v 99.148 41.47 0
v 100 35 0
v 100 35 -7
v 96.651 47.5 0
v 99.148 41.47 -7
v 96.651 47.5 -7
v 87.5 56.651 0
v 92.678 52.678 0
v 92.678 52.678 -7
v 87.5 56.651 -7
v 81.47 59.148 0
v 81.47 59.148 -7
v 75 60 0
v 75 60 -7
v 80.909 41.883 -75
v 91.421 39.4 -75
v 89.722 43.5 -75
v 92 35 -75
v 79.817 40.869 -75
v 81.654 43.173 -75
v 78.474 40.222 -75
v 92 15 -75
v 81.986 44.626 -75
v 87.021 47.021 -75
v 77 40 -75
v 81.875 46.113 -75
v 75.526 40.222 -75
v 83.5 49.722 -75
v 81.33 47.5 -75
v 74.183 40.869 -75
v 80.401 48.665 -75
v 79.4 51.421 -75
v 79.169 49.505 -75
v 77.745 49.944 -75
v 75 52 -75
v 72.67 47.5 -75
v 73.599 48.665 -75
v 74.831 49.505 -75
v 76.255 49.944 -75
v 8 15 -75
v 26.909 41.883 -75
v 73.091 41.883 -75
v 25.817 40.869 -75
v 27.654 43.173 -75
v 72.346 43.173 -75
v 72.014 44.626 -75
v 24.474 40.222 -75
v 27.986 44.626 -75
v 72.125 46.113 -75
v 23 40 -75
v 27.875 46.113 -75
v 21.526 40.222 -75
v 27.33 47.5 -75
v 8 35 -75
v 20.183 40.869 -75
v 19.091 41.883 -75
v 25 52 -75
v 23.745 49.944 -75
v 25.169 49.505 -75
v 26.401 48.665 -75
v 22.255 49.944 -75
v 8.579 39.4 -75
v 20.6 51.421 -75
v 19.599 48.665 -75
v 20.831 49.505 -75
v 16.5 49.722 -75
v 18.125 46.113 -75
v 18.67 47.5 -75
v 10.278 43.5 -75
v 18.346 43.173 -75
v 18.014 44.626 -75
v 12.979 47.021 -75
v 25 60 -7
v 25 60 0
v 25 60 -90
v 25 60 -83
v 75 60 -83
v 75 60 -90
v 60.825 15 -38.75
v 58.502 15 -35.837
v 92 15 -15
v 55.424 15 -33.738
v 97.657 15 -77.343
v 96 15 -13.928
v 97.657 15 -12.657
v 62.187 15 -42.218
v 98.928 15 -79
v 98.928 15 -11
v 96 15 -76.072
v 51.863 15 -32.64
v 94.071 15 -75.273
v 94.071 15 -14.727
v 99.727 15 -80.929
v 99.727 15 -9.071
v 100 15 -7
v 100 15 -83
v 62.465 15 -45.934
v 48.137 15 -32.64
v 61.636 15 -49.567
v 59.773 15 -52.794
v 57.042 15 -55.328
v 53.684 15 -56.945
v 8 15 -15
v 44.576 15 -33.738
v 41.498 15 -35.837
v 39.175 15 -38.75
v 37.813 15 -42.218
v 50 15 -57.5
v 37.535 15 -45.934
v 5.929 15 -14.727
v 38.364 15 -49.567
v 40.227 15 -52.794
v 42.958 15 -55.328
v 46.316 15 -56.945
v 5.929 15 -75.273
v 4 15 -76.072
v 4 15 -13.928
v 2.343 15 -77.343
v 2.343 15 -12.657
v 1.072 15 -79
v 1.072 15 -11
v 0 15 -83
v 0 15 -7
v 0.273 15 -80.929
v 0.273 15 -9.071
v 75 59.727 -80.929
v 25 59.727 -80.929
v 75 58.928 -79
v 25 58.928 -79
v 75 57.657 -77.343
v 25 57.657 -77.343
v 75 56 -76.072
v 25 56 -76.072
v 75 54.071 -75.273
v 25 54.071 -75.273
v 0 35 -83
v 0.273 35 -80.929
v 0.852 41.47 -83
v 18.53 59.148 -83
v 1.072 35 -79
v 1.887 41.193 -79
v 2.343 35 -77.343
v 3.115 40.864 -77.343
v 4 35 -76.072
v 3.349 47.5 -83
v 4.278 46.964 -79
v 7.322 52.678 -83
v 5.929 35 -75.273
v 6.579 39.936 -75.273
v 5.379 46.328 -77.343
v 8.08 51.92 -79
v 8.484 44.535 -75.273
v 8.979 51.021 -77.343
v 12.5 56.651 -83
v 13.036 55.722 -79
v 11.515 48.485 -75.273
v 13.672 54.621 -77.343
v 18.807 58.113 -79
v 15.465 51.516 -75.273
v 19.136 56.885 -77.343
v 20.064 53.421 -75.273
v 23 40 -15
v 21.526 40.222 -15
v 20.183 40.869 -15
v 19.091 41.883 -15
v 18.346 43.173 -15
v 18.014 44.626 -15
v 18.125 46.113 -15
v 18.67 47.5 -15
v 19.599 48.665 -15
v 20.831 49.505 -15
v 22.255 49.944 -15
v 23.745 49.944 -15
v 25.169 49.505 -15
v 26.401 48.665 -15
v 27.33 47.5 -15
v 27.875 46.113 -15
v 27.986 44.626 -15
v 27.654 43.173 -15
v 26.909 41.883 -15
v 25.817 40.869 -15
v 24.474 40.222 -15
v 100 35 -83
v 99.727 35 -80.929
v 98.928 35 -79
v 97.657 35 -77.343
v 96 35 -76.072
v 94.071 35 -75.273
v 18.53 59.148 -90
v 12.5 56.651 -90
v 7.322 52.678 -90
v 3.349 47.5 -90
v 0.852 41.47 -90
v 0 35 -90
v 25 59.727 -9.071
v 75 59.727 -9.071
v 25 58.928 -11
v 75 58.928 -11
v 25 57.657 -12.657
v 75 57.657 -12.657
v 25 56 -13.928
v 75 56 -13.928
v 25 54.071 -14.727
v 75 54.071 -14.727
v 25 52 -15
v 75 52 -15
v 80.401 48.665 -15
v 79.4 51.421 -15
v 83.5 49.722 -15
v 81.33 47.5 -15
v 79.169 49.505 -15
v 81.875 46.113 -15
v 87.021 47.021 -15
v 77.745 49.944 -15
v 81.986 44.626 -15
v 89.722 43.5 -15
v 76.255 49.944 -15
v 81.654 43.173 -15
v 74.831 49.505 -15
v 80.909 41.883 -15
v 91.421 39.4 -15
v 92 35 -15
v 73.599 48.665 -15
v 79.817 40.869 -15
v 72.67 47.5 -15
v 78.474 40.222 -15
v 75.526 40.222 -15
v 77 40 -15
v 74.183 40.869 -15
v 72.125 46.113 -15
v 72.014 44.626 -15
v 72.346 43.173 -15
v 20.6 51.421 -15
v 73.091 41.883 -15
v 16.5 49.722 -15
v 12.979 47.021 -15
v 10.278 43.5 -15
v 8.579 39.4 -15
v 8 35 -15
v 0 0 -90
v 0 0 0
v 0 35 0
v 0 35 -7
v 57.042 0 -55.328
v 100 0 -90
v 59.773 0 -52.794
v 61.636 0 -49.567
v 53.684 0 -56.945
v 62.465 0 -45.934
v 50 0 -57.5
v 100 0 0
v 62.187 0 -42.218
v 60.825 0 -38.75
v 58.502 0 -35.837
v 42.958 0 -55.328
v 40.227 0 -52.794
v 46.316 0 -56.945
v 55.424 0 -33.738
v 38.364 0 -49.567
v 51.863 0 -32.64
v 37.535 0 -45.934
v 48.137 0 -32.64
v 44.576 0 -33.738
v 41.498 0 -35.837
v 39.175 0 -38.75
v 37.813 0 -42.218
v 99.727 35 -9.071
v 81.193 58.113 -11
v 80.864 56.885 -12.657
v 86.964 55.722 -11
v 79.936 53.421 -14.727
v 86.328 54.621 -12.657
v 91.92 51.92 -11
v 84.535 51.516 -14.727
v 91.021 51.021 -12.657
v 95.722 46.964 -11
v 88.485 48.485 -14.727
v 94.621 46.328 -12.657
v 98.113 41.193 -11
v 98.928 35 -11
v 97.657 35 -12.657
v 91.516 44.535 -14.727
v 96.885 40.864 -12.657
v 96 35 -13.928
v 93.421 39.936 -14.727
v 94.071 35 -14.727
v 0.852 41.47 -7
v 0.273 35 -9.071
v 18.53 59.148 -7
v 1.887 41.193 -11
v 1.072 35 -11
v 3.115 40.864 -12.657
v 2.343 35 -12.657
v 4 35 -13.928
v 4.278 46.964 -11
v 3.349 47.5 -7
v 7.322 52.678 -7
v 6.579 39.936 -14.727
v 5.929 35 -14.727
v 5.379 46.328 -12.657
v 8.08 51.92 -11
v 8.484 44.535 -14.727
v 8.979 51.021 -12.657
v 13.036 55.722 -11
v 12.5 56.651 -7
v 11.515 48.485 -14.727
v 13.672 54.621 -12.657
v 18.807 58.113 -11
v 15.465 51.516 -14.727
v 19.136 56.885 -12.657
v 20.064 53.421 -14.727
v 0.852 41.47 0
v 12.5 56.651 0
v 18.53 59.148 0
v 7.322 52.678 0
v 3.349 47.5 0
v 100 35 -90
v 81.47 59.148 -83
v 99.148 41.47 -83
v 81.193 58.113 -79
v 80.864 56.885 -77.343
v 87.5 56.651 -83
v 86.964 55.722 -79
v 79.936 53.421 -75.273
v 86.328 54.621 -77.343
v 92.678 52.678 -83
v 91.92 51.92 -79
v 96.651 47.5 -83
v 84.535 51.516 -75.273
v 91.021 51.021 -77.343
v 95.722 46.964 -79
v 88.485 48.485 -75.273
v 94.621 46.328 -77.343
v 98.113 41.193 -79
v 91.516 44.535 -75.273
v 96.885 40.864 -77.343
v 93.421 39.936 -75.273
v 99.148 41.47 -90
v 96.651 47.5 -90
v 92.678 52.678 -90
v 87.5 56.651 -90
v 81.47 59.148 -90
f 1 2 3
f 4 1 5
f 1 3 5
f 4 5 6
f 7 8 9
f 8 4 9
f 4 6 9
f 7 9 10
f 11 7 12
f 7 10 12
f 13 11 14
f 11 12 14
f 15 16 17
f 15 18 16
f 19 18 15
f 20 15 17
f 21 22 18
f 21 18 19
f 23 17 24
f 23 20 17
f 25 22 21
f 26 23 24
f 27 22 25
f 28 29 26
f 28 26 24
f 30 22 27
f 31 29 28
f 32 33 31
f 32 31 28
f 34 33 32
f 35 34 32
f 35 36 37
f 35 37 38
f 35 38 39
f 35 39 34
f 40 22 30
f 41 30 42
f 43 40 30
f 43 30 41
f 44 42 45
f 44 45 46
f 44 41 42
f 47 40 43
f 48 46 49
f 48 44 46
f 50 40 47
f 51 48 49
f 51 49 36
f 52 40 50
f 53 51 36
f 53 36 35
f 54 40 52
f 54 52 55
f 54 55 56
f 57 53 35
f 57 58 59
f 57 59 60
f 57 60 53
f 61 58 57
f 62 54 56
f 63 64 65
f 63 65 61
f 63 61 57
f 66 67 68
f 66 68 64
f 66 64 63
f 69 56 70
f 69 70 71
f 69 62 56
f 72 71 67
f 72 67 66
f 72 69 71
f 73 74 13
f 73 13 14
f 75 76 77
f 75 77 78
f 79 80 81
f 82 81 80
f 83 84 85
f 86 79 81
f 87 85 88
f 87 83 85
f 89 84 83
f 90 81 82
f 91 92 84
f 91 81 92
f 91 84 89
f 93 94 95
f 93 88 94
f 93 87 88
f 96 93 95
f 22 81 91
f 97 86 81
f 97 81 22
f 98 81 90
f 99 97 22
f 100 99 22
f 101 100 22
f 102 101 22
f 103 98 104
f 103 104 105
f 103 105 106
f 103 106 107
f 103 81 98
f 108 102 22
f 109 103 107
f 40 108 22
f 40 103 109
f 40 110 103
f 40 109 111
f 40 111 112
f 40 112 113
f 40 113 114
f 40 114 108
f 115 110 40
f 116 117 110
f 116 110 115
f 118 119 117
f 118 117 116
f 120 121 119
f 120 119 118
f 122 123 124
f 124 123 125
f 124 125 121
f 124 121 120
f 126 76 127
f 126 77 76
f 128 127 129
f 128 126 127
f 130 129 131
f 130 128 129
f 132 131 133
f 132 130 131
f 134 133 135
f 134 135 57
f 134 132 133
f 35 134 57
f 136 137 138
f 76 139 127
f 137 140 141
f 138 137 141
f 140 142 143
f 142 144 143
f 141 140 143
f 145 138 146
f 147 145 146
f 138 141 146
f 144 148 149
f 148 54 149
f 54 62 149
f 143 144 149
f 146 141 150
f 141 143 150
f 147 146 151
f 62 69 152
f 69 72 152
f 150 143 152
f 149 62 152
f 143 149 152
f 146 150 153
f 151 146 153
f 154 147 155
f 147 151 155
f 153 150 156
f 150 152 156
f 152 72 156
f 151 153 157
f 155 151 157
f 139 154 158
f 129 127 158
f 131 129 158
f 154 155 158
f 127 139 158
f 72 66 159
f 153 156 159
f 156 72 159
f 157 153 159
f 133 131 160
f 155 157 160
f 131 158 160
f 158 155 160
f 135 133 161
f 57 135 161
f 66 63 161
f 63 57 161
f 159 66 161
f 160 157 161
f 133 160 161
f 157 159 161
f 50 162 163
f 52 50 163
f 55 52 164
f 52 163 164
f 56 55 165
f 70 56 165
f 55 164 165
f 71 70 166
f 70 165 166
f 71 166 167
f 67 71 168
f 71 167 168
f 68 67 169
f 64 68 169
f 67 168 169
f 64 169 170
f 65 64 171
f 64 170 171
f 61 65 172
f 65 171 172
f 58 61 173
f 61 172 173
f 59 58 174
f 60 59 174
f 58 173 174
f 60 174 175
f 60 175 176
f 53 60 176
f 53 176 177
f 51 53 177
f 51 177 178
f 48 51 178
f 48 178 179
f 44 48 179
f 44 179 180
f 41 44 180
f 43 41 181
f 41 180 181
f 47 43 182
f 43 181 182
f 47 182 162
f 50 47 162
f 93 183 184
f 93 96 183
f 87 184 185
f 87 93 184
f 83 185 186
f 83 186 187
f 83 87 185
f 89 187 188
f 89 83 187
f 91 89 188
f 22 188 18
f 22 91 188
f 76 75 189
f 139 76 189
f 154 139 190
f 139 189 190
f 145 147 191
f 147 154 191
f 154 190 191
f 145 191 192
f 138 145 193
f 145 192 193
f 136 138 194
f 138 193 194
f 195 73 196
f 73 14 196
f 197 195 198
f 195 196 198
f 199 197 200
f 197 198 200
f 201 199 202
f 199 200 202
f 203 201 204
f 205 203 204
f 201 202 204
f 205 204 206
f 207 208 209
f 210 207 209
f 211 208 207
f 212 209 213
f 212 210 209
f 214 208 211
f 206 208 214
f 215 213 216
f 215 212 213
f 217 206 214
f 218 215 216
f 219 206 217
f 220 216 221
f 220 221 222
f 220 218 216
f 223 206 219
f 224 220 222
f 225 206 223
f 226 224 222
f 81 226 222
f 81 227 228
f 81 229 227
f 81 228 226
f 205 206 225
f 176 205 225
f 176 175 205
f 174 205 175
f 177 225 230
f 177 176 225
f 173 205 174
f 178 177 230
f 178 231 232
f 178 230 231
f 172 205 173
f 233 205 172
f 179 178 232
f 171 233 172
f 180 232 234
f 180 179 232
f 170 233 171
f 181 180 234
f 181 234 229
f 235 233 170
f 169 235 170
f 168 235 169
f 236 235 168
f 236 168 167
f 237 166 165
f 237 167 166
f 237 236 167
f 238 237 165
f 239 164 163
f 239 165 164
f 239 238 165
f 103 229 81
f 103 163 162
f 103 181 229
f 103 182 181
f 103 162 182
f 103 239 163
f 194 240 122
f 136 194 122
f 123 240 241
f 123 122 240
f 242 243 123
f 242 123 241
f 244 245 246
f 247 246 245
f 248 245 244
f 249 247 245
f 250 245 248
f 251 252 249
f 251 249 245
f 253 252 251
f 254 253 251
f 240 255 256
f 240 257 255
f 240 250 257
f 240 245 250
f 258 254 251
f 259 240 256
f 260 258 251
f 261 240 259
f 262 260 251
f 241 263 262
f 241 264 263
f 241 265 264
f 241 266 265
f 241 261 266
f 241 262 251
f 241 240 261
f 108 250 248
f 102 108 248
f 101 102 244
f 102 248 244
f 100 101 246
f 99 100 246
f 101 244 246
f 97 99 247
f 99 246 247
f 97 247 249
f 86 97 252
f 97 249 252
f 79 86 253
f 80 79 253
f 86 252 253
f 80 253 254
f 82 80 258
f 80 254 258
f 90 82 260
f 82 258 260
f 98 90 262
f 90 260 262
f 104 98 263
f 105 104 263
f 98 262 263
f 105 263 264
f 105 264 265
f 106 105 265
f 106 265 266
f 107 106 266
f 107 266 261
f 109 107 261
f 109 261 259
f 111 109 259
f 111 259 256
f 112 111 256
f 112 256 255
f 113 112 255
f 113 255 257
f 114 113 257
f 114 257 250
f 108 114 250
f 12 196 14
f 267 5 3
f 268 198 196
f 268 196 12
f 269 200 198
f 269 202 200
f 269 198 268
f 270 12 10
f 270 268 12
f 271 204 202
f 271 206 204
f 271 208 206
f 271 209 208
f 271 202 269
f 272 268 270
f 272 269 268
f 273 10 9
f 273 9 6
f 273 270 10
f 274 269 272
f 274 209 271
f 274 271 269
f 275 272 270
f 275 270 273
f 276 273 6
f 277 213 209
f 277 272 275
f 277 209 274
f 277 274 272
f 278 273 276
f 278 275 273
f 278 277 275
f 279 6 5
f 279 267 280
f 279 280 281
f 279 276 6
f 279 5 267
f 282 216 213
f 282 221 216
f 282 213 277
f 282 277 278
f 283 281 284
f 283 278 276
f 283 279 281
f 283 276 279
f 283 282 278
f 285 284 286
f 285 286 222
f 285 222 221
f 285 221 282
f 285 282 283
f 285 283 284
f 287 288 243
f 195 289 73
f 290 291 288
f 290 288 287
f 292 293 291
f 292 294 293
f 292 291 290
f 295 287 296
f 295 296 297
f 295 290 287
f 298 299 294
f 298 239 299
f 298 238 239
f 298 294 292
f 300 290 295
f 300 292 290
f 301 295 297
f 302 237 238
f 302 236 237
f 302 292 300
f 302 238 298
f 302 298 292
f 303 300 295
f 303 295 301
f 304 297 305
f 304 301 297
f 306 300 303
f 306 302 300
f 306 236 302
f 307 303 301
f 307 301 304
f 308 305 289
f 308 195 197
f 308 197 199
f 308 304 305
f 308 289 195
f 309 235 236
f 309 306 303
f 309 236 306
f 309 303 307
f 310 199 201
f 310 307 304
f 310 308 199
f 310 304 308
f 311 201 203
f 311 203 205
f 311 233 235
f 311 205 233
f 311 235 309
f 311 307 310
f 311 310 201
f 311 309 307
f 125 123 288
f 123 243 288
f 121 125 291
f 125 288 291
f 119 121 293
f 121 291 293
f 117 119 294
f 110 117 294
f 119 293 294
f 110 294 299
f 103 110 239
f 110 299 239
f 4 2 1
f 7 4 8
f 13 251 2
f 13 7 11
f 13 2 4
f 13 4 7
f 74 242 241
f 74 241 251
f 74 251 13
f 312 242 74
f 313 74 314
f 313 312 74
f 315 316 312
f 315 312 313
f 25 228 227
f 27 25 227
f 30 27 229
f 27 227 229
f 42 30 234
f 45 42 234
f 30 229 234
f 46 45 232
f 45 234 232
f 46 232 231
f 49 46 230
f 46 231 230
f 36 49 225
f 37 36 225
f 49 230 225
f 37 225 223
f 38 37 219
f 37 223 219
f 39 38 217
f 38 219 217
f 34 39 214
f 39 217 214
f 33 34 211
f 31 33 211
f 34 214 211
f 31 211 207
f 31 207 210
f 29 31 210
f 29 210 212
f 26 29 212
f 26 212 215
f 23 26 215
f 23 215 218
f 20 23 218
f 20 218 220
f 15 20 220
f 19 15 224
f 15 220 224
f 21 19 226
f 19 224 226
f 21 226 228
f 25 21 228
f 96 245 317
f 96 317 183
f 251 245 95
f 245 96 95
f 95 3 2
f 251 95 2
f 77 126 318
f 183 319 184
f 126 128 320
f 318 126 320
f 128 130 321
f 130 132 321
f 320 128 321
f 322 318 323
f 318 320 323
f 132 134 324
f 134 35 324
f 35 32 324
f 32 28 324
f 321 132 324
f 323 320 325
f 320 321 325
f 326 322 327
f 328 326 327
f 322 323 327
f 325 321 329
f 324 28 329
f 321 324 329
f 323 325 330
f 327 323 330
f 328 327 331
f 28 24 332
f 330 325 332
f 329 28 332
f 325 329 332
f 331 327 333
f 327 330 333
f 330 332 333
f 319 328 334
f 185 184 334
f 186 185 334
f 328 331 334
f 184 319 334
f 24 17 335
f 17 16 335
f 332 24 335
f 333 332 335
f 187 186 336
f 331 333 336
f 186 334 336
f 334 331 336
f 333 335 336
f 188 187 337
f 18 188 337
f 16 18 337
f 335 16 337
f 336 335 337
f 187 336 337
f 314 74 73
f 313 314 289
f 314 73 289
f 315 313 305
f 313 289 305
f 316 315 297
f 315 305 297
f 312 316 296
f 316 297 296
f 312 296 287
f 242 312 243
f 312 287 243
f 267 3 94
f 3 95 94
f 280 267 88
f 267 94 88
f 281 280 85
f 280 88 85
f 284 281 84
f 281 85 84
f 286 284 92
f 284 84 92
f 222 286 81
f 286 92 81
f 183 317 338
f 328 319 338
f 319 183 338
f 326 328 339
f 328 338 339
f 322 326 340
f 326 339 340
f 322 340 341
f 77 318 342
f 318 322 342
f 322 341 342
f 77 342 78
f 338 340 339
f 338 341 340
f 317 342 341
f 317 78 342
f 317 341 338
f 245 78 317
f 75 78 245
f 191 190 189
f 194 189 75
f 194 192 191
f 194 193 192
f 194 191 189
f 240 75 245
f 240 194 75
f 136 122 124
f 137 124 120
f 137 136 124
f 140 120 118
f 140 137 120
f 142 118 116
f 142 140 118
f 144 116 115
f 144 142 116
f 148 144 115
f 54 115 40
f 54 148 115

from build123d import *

# Parameters (mm, degrees)
BOSS_EXTRUDE1_DEPTH = 100
SKETCH2_R           = 5
BOSS_EXTRUDE2_DEPTH = 60
SKETCH3_R           = 12.5
CUT_EXTRUDE1_DEPTH  = 148.309198627
CUT_EXTRUDE2_DEPTH  = 148.309198627
FILLET1_R           = 8


with BuildPart() as part:
    # Sketch1 → Boss-Extrude1 (new body)
    with BuildSketch(Plane(origin=(0, 0, 0), x_dir=(0, 0, -1), z_dir=(1, 0, 0))):
        Polygon((0, 0), (0, 60), (15, 60), (15, 15), (75, 15), (75, 60), (90, 60), (90, 0), align=None)
    extrude(amount=BOSS_EXTRUDE1_DEPTH)

    # Sketch2 → Boss-Extrude2 (add)
    with BuildSketch(Plane(origin=(0, 0, -15), x_dir=(-1, 0, 0), z_dir=(0, 0, -1))):
        with Locations(Location((-77, 45, 0), (0, 0, 270))):
            Circle(SKETCH2_R)
        with Locations(Location((-23, 45, 0), (0, 0, 270))):
            Circle(SKETCH2_R)
    extrude(amount=BOSS_EXTRUDE2_DEPTH)

    # Sketch3 → Cut-Extrude1 (cut, through all)
    with BuildSketch(Plane.XZ):
        with Locations(Location((50, -45, 0), (0, 0, 270))):
            Circle(SKETCH3_R)
    extrude(amount=-CUT_EXTRUDE1_DEPTH, mode=Mode.SUBTRACT)

    # Sketch4 → Cut-Extrude2 (cut, through all)
    with BuildSketch(Plane(origin=(0, 0, -90), x_dir=(-1, 0, 0), z_dir=(0, 0, -1))):
        with BuildLine():
            ThreePointArc((-100, 35), (-92.67766953, 52.67766953), (-75, 60))
            Line((-75, 60), (-100, 60))
            Line((-100, 60), (-100, 35))
        make_face()
        with BuildLine():
            ThreePointArc((-25, 60), (-7.32233047, 52.67766953), (0, 35))
            Line((0, 35), (0, 60))
            Line((0, 60), (-25, 60))
        make_face()
    extrude(amount=-CUT_EXTRUDE2_DEPTH, mode=Mode.SUBTRACT)

    # Fillet1
    fillet1_edges = [part.edges().sort_by_distance(p)[0] for p in [
        (100, 25, -15),
        (0, 25, -75),
        (100, 25, -75),
        (50, 60, -15),
        (50, 60, -75),
        (92.67766953, 52.67766953, -75),
        (92.67766953, 52.67766953, -15),
        (7.32233047, 52.67766953, -75),
        (7.32233047, 52.67766953, -15),
        (0, 25, -15),
    ]]
    fillet(fillet1_edges, radius=FILLET1_R)


solid = part.part
